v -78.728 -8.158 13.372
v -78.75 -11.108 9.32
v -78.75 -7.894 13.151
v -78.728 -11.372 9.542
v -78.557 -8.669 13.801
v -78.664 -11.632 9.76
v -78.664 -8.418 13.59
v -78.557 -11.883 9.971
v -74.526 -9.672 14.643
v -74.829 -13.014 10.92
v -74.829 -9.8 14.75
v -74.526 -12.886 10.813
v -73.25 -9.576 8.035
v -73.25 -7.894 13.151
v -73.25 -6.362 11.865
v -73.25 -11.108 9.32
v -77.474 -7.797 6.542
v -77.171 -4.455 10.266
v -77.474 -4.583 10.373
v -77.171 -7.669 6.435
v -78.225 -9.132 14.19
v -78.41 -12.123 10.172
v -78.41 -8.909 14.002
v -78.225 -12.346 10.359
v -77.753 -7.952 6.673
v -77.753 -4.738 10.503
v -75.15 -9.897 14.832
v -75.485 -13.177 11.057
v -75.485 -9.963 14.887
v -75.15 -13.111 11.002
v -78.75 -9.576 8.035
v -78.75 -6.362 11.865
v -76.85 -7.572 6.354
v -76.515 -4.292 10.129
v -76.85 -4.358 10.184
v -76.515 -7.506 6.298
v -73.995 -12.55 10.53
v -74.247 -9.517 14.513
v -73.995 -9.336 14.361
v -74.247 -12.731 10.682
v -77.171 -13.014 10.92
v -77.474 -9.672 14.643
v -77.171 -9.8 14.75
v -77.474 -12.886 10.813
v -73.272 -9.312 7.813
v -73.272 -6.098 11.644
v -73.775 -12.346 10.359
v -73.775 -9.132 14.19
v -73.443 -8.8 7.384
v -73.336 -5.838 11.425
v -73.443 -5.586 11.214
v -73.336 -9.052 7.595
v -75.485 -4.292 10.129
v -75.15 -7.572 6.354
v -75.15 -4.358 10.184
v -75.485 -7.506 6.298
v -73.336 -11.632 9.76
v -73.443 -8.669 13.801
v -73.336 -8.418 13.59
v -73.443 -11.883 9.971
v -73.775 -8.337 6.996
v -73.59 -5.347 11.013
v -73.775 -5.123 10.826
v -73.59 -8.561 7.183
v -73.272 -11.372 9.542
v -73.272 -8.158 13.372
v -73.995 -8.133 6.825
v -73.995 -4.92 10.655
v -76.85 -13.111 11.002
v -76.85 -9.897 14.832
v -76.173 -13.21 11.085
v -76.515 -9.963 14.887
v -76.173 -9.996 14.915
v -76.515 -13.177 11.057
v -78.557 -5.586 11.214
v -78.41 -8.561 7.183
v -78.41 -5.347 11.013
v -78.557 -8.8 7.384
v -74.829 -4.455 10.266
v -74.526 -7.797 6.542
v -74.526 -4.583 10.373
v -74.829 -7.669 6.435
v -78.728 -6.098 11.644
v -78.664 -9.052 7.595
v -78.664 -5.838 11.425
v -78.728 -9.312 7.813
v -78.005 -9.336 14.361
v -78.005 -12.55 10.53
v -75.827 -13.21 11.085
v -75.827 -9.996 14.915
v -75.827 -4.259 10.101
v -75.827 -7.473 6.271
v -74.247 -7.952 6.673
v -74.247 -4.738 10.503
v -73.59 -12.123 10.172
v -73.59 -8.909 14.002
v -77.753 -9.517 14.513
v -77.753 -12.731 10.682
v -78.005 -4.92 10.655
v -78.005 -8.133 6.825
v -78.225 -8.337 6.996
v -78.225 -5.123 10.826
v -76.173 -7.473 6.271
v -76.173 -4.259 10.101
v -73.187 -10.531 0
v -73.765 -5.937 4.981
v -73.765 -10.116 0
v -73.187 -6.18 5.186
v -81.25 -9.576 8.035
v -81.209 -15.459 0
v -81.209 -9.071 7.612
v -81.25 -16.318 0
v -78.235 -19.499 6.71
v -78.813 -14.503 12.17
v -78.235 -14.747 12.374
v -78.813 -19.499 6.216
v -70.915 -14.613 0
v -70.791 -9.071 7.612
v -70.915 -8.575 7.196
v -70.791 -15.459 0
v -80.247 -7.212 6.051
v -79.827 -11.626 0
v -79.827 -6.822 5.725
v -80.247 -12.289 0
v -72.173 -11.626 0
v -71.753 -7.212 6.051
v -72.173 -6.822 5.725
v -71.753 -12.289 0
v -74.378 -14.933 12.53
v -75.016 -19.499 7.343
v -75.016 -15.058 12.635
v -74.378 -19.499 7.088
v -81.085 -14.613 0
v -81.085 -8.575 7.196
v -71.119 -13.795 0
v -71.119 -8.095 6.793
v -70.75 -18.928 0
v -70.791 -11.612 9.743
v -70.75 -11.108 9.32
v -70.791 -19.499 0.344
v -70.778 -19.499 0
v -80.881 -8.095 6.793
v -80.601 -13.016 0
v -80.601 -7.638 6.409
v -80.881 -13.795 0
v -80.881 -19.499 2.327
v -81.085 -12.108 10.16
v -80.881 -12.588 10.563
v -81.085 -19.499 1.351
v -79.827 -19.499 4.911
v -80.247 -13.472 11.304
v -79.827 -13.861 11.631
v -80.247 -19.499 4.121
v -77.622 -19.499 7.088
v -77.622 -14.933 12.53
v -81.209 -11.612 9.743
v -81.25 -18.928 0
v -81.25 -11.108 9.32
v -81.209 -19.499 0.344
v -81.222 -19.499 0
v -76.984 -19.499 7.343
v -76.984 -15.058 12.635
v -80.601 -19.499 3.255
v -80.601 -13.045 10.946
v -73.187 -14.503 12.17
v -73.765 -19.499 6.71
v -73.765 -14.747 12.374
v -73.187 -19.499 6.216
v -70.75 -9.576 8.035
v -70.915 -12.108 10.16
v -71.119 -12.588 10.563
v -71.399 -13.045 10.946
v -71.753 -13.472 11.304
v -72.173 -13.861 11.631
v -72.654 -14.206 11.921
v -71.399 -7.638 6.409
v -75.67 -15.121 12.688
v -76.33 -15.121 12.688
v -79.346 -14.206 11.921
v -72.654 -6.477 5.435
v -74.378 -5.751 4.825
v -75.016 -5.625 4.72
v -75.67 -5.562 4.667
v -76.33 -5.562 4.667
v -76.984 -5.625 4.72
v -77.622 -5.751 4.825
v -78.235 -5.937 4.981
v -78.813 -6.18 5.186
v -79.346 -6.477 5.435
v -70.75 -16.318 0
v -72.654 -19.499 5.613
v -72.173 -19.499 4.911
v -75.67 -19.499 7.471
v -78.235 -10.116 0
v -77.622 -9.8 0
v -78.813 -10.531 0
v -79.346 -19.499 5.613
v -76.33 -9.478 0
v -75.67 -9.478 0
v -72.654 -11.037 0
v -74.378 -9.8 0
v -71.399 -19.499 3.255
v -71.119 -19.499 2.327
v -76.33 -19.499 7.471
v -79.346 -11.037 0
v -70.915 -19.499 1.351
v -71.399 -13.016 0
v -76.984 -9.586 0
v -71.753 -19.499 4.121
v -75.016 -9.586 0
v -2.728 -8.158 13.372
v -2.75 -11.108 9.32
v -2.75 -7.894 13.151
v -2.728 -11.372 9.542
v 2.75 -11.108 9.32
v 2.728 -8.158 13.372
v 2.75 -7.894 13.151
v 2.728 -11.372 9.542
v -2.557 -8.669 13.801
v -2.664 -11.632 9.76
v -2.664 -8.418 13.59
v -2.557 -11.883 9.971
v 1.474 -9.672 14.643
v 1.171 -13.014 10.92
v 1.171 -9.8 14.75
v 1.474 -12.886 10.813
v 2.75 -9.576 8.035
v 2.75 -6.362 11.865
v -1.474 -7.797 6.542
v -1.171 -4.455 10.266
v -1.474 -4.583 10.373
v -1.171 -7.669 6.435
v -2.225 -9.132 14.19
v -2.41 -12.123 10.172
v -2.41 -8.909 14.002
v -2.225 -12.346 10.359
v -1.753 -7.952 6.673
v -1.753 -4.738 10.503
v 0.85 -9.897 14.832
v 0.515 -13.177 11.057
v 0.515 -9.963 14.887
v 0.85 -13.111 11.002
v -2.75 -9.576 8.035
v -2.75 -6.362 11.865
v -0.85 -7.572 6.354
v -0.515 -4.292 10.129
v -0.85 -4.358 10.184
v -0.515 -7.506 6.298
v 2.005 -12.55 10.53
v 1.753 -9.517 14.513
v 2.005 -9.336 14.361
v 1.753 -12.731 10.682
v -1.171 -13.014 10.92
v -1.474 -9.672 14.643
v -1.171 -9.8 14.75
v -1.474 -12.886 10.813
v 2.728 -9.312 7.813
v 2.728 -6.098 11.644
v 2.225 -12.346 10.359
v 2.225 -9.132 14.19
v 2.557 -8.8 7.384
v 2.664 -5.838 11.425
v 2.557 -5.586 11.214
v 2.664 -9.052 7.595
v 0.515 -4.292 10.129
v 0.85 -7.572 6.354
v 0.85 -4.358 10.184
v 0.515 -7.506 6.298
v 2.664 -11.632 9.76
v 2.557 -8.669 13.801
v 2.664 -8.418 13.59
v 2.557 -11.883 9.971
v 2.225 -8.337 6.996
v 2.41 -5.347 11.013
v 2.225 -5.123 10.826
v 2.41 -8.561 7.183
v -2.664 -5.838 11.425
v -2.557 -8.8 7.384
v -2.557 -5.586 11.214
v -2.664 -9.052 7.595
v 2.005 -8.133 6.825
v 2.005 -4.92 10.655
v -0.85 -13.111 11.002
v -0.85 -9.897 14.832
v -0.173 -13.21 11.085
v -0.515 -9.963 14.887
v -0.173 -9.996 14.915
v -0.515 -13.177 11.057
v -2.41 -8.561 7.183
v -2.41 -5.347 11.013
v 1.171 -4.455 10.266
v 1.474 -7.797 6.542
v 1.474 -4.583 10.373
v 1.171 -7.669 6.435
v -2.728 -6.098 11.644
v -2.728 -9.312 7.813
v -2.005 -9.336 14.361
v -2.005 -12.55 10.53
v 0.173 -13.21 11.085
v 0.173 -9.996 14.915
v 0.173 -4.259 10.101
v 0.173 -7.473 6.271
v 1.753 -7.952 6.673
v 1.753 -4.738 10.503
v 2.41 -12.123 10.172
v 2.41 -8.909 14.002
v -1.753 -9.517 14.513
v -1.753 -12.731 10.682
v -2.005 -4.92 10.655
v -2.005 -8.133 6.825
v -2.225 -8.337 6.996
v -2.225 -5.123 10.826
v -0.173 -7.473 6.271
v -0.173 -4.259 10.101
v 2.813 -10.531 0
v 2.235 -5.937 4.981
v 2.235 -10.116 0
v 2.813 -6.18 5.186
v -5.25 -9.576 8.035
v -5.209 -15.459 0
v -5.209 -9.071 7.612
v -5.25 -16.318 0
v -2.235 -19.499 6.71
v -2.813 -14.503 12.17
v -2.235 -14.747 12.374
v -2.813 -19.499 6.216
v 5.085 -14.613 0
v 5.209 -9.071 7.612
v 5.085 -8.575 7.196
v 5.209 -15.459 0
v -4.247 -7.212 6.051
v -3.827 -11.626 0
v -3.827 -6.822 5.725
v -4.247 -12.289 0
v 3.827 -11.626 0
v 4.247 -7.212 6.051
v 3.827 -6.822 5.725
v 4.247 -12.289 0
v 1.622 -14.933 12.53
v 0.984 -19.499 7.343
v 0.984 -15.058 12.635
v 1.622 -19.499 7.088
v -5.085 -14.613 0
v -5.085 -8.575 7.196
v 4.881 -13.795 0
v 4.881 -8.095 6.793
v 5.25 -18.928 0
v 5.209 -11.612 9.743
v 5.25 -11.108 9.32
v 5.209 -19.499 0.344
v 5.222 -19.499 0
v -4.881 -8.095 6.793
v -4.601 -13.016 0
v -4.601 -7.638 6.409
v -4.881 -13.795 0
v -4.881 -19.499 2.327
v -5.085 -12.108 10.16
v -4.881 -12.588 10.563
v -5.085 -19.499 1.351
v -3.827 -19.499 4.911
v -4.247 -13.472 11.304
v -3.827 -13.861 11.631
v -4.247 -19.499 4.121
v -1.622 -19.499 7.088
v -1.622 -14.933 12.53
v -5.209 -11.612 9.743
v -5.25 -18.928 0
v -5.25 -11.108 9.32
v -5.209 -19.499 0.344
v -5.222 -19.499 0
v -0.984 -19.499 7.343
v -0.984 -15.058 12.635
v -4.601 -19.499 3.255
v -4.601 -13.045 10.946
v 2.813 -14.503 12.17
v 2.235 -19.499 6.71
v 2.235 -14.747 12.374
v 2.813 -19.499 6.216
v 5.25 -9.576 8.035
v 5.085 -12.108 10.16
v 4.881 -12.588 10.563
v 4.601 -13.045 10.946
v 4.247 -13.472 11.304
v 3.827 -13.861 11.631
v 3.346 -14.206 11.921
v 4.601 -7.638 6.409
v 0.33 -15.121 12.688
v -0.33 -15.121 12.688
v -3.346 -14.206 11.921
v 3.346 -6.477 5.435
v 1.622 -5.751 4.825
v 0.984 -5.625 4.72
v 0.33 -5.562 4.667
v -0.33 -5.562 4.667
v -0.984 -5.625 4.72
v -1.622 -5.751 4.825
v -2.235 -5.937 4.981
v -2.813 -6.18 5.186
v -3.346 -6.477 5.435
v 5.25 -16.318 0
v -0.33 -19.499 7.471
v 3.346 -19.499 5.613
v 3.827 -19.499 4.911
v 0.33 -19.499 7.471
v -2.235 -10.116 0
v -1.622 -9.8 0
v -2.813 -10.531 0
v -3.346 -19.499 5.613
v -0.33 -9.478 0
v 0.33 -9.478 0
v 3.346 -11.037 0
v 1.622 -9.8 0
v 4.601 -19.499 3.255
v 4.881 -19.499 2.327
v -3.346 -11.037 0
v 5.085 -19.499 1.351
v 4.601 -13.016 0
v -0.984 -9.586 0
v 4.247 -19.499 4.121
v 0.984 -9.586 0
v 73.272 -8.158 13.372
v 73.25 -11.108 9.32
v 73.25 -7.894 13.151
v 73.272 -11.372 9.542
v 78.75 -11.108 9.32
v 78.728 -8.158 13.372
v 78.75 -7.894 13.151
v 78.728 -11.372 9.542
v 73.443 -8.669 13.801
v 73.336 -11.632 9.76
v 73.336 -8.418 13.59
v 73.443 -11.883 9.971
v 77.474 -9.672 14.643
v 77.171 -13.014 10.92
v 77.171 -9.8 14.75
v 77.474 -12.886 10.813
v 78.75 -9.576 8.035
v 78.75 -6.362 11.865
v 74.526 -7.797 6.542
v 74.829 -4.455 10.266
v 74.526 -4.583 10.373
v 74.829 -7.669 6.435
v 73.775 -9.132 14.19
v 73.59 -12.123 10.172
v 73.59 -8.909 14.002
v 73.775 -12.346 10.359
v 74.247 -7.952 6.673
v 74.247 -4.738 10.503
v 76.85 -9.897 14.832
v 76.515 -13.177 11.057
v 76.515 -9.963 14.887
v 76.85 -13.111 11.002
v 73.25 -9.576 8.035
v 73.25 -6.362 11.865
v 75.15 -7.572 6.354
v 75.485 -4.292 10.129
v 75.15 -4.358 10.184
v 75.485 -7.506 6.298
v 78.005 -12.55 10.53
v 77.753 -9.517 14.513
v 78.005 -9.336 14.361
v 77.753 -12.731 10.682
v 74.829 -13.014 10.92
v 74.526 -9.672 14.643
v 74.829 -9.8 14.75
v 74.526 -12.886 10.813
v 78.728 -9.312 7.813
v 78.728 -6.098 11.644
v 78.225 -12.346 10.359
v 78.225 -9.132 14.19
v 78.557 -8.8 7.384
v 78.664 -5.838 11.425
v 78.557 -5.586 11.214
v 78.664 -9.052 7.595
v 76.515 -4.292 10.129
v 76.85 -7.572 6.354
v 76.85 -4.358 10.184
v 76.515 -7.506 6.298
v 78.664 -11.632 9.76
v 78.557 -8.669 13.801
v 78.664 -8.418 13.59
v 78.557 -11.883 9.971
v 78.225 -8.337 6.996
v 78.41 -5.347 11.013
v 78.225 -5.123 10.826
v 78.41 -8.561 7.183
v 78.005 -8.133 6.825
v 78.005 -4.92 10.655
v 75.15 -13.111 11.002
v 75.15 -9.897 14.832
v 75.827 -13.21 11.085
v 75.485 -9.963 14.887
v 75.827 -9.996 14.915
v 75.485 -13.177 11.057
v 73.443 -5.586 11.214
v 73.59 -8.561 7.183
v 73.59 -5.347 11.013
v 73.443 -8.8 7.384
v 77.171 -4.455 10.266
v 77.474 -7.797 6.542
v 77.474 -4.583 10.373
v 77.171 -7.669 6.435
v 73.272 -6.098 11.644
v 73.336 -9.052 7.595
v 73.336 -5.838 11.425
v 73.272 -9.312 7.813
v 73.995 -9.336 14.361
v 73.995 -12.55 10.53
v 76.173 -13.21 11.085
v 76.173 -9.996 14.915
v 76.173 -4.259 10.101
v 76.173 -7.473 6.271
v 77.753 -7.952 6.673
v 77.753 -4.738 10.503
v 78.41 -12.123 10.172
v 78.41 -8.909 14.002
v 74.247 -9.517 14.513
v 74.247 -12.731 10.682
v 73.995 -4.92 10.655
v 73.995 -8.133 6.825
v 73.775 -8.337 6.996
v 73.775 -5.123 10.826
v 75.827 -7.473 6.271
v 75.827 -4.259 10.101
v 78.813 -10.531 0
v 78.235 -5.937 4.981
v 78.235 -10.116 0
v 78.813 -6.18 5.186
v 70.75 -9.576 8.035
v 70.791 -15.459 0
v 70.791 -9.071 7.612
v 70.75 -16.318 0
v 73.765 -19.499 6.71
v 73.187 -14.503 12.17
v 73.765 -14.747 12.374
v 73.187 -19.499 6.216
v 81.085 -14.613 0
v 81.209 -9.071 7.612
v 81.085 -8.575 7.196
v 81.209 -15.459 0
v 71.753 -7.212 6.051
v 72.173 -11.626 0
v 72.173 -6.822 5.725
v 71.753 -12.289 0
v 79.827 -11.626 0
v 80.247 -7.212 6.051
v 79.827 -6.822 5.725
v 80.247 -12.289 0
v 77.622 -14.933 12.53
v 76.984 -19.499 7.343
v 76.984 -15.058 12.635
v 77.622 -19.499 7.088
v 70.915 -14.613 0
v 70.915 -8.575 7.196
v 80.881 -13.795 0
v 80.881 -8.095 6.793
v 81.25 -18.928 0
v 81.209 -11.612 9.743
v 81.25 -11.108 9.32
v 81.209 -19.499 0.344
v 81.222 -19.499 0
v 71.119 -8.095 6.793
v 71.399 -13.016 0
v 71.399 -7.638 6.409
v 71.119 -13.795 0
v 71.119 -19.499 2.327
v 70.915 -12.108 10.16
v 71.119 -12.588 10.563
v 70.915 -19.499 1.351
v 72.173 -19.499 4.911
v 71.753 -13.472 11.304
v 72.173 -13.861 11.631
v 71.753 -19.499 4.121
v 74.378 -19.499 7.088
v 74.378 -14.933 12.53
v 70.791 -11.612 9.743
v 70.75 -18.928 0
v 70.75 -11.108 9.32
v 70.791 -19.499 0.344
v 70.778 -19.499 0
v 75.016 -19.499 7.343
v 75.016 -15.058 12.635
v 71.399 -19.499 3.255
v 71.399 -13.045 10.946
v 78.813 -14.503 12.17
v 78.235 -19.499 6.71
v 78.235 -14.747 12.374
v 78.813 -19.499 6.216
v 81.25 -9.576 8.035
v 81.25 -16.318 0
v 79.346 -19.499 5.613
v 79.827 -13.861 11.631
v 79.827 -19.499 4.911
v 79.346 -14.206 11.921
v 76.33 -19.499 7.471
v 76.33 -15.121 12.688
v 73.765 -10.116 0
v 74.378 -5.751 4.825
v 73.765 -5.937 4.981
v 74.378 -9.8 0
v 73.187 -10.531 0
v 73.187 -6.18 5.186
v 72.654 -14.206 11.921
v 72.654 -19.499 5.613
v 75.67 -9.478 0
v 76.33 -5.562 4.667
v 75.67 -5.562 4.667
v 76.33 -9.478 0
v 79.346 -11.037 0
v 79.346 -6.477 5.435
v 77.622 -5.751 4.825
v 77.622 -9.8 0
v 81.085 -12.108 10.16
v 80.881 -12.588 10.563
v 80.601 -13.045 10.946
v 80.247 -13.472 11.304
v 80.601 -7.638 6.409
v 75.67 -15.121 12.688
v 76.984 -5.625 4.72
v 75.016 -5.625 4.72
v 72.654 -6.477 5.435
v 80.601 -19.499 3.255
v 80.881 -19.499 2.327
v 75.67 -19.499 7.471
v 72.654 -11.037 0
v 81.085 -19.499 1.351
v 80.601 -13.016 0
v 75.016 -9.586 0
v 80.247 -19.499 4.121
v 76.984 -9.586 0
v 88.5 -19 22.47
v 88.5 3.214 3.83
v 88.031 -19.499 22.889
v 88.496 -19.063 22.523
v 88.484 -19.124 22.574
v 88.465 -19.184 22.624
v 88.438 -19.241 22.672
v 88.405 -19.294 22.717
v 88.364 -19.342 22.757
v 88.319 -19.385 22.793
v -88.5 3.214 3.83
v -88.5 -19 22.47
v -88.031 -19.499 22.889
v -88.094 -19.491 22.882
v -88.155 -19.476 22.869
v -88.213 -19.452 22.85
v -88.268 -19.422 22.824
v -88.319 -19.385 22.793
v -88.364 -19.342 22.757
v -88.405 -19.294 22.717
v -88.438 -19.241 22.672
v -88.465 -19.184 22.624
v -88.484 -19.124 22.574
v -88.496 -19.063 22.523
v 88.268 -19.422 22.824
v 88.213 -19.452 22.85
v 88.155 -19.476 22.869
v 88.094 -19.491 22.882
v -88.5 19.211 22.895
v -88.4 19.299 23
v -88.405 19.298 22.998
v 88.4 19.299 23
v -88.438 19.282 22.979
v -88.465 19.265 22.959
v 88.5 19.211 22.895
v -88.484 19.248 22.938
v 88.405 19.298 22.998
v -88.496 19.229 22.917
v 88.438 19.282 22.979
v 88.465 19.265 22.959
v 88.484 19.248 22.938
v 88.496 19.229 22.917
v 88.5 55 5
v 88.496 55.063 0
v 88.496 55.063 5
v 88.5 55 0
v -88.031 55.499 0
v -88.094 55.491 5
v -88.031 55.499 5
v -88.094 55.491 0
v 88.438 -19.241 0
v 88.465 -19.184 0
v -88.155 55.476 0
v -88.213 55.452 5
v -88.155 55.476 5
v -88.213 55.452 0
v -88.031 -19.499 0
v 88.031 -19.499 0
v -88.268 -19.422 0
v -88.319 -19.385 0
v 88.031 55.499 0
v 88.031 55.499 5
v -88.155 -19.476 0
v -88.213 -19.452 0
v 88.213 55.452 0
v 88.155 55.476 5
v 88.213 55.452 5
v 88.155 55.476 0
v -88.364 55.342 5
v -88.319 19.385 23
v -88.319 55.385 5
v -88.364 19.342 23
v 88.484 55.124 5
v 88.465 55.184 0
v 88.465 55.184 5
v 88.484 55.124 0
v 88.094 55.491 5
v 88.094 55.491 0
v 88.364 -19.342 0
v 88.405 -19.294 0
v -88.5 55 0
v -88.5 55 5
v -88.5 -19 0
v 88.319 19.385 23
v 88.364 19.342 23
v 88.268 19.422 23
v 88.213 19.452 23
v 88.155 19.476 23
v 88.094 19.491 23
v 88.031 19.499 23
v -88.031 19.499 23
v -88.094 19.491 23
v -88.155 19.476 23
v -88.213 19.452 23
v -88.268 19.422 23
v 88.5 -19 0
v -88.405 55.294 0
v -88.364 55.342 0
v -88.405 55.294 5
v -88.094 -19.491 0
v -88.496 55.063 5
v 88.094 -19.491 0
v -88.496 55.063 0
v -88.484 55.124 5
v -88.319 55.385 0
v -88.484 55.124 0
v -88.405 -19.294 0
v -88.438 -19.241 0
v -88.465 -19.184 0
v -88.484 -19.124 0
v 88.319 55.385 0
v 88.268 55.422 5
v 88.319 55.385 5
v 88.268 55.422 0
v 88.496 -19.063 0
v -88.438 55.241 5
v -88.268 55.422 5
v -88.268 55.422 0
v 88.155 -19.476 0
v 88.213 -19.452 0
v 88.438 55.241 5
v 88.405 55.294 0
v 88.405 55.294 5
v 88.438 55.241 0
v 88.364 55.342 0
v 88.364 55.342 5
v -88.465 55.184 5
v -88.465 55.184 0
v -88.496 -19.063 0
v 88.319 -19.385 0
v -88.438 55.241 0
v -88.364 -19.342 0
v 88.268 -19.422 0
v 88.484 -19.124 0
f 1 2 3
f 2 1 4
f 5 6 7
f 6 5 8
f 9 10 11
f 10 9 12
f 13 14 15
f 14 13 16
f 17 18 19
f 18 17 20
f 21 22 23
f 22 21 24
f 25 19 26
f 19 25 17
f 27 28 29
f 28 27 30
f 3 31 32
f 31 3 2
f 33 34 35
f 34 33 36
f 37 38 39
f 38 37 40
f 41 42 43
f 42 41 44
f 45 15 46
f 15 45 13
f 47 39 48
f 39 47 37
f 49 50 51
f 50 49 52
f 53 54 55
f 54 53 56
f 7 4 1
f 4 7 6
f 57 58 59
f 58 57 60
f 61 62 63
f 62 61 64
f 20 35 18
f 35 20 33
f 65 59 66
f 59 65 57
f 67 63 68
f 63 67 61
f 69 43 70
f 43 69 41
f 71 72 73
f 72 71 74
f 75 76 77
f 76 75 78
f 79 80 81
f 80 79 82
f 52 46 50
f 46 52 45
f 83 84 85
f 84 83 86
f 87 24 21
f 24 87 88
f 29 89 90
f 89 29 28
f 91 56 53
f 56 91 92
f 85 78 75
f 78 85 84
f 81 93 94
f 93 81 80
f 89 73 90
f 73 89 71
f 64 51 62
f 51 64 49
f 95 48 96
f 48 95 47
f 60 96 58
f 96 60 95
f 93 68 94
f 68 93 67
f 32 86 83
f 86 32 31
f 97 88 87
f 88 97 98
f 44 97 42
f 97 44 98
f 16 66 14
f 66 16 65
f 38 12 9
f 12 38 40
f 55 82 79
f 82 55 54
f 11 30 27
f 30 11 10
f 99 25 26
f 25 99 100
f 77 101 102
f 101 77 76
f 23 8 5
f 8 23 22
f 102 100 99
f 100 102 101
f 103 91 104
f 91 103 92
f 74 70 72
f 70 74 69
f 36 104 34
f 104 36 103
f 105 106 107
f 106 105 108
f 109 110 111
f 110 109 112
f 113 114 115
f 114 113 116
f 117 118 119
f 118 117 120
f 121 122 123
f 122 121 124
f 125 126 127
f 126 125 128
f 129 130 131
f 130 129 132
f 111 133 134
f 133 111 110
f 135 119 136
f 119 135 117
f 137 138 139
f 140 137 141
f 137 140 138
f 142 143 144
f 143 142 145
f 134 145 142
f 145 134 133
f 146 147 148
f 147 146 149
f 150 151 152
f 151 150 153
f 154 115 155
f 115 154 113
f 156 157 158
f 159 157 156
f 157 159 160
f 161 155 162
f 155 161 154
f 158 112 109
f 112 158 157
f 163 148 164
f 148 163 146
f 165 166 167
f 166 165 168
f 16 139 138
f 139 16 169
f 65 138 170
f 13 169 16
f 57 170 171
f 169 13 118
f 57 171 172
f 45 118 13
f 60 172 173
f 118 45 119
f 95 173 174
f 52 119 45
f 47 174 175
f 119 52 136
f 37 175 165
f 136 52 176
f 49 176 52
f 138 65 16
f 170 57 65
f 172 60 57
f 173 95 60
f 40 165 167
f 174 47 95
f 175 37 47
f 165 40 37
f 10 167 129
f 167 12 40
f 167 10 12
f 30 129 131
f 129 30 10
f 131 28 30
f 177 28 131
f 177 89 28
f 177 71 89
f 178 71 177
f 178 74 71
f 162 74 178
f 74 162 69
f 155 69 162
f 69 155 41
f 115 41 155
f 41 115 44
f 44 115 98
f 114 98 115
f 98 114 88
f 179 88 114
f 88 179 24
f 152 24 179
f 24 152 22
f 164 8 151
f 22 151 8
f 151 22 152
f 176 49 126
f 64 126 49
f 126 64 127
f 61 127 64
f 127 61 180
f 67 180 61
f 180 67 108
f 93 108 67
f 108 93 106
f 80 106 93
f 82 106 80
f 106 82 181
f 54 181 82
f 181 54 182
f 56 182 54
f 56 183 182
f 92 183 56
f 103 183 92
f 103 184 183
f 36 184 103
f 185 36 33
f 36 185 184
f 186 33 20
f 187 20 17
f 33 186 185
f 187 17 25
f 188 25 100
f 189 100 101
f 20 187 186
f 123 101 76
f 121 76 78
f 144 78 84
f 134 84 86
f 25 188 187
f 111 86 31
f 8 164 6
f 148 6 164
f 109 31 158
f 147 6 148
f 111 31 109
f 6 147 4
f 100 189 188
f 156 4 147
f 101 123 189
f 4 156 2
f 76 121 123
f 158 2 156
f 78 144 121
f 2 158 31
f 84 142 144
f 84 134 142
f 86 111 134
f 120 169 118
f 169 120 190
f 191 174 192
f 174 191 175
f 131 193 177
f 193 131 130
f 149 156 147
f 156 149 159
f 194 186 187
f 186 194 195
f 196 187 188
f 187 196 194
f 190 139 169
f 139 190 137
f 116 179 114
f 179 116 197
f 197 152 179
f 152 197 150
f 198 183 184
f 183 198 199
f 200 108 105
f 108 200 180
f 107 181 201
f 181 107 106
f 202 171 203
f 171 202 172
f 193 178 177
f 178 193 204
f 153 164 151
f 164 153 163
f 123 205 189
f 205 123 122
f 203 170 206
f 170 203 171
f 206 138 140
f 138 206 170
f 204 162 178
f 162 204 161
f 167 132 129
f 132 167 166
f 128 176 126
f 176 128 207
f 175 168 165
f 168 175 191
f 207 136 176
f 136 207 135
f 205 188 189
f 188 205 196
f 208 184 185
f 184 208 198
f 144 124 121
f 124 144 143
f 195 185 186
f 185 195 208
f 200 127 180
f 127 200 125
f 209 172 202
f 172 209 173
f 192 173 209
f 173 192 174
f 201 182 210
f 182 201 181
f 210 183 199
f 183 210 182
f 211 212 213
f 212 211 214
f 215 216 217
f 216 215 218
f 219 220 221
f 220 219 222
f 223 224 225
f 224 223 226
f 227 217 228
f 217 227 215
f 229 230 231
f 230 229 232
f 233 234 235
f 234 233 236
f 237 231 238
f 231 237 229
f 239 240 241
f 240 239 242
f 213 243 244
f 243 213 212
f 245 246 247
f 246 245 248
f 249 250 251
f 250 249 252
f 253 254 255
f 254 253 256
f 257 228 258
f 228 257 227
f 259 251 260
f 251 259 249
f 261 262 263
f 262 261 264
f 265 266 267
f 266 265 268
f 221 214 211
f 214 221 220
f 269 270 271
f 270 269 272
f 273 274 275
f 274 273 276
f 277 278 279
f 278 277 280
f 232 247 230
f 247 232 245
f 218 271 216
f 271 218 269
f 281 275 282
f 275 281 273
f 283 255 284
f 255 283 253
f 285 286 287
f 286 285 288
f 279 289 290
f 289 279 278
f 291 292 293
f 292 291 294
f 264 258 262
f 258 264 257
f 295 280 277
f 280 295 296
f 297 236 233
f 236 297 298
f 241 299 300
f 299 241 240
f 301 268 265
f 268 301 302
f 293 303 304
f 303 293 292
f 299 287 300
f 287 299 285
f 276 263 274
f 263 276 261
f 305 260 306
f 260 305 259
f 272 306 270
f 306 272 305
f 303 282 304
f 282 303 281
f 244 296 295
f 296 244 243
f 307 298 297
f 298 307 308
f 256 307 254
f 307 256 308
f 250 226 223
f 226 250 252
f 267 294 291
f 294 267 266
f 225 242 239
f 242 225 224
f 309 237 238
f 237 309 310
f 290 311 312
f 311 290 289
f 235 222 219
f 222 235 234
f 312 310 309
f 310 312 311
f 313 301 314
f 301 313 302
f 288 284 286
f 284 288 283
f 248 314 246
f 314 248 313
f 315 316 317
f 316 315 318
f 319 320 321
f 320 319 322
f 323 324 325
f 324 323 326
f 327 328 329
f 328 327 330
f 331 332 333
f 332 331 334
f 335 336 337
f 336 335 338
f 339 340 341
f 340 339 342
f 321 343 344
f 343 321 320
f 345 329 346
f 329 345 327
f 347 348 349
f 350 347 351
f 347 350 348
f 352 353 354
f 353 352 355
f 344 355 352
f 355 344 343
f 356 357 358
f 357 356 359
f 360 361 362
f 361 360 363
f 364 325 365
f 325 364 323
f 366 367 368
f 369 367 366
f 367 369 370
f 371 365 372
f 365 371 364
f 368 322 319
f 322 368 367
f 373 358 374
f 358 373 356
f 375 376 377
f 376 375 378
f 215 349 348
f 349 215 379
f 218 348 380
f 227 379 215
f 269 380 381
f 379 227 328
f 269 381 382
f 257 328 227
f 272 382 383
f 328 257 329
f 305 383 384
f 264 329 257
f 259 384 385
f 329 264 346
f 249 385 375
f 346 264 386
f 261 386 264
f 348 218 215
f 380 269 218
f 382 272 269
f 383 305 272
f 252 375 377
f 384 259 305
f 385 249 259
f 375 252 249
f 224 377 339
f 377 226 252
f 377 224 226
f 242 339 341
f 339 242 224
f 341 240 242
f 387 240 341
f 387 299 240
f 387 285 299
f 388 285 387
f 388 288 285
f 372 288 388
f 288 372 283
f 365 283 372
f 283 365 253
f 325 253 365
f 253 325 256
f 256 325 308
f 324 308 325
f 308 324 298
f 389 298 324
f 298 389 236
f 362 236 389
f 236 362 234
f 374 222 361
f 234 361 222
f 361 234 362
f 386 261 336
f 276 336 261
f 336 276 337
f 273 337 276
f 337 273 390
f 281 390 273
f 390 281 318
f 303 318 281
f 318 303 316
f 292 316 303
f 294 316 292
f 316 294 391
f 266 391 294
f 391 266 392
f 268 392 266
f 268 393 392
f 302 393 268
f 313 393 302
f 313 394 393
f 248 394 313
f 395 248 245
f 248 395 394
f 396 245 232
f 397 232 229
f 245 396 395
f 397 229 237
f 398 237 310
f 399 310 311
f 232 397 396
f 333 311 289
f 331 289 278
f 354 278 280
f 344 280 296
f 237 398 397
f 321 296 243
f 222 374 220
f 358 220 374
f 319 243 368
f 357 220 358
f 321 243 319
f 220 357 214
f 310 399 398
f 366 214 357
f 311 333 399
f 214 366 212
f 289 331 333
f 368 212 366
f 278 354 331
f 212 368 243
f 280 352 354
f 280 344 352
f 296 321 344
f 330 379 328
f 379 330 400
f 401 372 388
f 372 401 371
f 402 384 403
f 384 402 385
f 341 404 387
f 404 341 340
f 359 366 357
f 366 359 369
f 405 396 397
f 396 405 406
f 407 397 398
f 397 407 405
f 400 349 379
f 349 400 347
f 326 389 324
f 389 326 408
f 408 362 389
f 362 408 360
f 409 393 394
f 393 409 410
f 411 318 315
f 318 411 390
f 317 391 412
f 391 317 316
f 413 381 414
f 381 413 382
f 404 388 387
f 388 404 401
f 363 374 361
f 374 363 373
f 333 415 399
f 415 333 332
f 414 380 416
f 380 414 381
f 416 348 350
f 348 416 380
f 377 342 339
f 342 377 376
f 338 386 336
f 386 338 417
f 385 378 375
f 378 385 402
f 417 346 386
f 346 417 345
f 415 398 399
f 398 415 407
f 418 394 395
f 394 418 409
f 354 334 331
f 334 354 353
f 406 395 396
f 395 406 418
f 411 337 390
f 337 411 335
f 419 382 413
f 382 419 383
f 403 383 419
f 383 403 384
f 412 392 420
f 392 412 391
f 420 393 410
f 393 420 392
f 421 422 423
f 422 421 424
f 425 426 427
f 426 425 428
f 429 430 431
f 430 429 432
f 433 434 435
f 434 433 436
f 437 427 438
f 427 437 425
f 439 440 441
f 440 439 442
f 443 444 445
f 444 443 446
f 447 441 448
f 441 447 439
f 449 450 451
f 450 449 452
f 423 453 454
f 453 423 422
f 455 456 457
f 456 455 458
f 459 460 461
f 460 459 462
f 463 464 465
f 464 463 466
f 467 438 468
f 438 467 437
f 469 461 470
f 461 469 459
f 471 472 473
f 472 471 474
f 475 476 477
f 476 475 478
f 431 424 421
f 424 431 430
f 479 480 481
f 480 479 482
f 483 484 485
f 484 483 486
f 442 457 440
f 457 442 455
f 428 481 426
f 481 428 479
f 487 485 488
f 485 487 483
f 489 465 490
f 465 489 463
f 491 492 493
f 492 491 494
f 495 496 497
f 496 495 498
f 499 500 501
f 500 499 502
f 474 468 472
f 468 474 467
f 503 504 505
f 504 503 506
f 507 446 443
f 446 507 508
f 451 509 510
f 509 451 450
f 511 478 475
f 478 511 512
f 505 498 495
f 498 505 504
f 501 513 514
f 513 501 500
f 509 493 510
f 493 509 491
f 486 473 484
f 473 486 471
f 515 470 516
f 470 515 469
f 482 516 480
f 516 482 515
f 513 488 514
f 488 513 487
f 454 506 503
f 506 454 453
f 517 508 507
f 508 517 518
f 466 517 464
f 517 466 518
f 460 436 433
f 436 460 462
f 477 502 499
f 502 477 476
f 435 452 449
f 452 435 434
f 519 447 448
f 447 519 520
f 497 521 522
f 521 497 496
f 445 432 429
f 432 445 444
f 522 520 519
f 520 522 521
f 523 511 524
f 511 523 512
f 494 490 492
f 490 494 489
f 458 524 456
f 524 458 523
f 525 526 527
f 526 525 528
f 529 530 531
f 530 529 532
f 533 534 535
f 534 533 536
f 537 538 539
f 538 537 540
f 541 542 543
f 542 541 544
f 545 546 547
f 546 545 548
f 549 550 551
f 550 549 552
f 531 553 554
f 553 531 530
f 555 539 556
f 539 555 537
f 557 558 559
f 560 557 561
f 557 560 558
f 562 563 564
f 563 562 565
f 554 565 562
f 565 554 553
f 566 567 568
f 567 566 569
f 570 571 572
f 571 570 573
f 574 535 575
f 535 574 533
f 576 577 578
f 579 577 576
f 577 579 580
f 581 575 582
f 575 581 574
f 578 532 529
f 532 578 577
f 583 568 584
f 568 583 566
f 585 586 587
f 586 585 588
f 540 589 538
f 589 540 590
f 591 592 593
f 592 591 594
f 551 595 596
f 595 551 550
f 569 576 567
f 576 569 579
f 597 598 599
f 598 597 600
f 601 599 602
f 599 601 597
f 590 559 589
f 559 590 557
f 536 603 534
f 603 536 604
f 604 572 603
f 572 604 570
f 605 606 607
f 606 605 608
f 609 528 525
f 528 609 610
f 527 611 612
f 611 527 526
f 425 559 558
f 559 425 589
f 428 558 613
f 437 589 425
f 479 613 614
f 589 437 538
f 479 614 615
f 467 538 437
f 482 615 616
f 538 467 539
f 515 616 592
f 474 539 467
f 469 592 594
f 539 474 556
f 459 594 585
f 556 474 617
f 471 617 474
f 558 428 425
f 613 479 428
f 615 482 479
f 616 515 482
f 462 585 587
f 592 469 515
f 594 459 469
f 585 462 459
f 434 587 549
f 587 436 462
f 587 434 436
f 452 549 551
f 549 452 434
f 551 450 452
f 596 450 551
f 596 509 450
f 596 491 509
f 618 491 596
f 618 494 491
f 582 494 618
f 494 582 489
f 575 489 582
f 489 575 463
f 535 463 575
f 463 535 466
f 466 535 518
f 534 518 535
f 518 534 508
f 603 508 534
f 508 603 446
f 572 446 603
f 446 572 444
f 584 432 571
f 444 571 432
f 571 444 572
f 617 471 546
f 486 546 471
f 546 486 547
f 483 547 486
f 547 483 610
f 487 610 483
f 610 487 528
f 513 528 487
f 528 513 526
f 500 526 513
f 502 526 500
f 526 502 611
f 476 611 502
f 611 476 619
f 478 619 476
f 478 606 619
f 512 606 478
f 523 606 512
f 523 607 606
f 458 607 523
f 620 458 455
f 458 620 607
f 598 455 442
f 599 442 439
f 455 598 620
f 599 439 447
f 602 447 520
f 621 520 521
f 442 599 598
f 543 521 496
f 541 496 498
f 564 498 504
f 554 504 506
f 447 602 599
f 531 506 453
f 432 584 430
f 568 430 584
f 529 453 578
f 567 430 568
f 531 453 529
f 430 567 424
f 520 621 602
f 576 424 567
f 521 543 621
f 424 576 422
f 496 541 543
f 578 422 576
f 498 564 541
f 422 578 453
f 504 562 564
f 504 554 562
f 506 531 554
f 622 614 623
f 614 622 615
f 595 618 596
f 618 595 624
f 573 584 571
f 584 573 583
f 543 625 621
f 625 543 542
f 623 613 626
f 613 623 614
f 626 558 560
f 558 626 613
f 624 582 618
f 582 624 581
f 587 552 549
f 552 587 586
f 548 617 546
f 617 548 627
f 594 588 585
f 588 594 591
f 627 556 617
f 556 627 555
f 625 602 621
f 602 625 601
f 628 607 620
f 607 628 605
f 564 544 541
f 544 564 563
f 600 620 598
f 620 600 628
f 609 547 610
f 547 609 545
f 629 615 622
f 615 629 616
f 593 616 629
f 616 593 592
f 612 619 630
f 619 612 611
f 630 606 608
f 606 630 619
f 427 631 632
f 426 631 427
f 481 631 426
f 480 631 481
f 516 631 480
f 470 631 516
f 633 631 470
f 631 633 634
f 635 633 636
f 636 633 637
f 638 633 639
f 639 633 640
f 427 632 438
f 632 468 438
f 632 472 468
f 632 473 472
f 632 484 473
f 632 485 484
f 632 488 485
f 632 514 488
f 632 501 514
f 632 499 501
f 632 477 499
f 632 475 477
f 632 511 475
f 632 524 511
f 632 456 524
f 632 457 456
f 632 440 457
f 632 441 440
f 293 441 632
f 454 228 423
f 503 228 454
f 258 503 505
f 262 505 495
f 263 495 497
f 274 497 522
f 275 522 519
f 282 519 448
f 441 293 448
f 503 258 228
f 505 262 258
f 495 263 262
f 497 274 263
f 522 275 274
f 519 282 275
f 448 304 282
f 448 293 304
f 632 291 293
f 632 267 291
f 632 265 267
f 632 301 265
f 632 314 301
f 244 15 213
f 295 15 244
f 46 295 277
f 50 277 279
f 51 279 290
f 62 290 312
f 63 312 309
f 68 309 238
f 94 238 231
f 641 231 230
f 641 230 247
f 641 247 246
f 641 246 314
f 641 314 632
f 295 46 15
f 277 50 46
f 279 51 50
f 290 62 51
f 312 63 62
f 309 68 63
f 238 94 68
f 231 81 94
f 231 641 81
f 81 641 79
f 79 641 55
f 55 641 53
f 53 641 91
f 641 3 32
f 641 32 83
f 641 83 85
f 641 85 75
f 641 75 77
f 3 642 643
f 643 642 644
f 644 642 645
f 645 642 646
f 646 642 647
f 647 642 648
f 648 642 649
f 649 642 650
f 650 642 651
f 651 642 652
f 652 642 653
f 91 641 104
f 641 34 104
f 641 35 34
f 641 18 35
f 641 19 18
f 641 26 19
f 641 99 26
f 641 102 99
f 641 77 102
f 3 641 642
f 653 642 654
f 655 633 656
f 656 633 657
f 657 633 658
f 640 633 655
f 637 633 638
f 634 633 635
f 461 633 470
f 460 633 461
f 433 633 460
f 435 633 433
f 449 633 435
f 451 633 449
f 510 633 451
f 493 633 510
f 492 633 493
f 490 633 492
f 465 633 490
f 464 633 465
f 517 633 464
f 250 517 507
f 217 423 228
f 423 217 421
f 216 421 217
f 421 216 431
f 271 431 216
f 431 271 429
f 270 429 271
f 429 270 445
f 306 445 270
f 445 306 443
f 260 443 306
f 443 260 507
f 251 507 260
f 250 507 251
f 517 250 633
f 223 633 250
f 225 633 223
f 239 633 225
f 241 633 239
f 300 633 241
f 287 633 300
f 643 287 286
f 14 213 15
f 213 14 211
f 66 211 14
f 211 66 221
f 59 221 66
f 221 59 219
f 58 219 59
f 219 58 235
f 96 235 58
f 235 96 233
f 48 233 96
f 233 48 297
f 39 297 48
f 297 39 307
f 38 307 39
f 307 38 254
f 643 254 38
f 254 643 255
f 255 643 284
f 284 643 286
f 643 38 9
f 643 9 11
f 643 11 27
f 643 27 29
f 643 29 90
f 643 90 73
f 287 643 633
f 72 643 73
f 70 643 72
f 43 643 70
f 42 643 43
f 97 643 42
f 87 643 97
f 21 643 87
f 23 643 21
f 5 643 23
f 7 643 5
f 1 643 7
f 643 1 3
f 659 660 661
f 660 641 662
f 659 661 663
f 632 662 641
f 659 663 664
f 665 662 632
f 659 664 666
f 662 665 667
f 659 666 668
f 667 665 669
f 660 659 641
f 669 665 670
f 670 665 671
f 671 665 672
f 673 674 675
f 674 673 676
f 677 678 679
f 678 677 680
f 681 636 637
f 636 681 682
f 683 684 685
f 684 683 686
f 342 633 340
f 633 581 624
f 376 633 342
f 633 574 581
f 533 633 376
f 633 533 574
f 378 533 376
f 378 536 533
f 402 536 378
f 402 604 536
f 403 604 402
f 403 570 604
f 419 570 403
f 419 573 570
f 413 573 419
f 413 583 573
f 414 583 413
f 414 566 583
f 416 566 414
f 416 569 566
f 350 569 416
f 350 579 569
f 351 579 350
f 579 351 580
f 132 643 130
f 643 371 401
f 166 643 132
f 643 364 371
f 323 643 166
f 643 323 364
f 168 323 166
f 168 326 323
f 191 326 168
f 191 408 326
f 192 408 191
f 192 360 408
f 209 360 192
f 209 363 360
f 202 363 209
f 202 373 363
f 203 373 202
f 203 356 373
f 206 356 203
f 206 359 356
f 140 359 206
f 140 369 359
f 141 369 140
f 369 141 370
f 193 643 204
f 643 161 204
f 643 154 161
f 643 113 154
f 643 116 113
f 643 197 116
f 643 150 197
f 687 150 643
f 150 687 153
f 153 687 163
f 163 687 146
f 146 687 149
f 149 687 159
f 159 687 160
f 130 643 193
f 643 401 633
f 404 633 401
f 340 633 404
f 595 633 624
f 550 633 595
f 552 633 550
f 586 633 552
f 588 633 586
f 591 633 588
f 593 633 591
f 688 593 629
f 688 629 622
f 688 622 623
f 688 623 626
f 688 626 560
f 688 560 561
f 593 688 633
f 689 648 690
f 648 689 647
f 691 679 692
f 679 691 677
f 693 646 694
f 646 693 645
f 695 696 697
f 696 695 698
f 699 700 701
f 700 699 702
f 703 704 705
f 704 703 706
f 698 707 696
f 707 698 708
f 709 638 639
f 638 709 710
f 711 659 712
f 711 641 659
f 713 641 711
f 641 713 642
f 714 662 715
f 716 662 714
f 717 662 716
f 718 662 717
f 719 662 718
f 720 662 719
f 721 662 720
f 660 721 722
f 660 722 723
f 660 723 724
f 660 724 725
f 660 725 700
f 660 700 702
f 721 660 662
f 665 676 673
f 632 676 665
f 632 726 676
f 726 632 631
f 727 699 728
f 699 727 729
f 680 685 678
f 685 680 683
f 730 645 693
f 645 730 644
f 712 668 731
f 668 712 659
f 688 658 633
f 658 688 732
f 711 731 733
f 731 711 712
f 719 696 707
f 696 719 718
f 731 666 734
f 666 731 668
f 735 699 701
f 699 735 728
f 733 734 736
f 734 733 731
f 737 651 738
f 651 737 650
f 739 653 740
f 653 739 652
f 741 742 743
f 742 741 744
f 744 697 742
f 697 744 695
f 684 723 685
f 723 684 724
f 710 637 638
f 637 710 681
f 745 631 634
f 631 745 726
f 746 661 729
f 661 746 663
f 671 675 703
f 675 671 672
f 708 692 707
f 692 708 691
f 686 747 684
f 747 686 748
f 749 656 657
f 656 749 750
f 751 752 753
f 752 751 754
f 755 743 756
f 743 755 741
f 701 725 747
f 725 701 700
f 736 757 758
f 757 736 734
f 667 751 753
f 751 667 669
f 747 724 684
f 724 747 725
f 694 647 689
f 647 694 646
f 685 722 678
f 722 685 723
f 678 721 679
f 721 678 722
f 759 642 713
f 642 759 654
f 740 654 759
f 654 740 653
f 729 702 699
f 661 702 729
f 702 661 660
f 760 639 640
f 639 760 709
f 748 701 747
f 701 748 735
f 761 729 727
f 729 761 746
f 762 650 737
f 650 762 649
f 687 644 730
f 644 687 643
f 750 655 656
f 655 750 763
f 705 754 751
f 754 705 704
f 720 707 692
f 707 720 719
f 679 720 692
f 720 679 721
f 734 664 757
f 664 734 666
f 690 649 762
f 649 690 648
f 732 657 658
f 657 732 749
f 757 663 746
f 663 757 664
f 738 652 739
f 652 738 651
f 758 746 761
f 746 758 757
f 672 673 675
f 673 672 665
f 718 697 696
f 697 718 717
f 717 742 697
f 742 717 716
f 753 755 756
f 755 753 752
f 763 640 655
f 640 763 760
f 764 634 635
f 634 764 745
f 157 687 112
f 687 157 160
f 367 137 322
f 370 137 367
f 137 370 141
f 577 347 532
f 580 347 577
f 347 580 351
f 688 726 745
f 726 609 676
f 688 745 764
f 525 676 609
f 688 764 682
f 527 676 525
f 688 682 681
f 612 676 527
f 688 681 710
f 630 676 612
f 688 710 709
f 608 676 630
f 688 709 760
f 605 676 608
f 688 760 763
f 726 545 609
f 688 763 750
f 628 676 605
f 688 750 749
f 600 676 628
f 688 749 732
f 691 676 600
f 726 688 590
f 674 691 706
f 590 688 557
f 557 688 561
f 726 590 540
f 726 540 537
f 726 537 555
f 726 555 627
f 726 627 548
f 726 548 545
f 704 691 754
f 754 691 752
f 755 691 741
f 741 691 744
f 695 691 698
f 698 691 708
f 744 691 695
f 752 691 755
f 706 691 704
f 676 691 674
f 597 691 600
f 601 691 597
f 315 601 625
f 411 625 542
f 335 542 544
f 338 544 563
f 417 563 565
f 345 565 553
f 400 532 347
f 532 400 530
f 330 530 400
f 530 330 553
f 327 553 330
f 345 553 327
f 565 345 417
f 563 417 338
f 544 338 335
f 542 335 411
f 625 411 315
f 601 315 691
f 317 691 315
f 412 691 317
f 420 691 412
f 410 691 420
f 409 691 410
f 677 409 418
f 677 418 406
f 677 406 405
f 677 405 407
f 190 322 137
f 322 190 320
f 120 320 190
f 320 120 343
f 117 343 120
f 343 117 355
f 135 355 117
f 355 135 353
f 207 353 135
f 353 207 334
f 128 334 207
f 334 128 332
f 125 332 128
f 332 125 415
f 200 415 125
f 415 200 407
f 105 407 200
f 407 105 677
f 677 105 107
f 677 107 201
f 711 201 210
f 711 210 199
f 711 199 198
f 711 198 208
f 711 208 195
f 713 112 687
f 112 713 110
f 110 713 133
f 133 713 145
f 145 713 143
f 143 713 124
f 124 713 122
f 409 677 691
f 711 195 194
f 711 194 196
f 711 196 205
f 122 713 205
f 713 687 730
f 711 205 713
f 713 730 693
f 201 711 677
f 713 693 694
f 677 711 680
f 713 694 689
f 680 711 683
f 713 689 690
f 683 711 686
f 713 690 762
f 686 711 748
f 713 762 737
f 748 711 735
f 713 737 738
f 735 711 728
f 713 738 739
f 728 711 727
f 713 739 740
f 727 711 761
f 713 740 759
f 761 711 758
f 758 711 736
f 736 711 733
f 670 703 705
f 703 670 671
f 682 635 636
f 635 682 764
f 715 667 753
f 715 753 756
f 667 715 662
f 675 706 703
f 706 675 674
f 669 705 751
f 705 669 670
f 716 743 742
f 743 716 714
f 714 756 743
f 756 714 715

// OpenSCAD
panelCaseWid         = 203;
panelCaseToHoleMidPt = 13.5;
panelCaseHoleDistX   = 76;

$fn=50;

difference() {
   base();
   rotate([-40,0,0]) translate([0,0,5]) cutoutForm();
}

module cutoutForm() {
   translate([-panelCaseWid/2,-30,0]) cube([panelCaseWid, 30, 50]);
   for(i=[-1,0,1]) {
      translate([i*panelCaseHoleDistX,-panelCaseToHoleMidPt,0]) hull() {
         translate([0,-1,-15]) cylinder(h=20,d=5.5);
         translate([0,1,-15]) cylinder(h=20,d=5.5);
      }
      translate([i*panelCaseHoleDistX,-panelCaseToHoleMidPt,0]) hull() {
         translate([0,-1,-30]) cylinder(h=25,d=10.5);
         translate([0,1,-30]) cylinder(h=25,d=10.5);
      }
   }
}

module base() {
   // translate([-178/2,-20,0]) cube([178,55,23]);
   hull() {
      translate([-178/2+1,-20+1,0]) cylinder(d=1,h=23);
      translate([178/2-1,-20+1,0]) cylinder(d=1,h=23);

      translate([-178/2+1,19,0]) cylinder(d=1,h=23);
      translate([178/2-1,19,0]) cylinder(d=1,h=23);

      translate([-178/2+1,55,0]) cylinder(d=1,h=5);
      translate([178/2-1,55,0]) cylinder(d=1,h=5);
   }
}
